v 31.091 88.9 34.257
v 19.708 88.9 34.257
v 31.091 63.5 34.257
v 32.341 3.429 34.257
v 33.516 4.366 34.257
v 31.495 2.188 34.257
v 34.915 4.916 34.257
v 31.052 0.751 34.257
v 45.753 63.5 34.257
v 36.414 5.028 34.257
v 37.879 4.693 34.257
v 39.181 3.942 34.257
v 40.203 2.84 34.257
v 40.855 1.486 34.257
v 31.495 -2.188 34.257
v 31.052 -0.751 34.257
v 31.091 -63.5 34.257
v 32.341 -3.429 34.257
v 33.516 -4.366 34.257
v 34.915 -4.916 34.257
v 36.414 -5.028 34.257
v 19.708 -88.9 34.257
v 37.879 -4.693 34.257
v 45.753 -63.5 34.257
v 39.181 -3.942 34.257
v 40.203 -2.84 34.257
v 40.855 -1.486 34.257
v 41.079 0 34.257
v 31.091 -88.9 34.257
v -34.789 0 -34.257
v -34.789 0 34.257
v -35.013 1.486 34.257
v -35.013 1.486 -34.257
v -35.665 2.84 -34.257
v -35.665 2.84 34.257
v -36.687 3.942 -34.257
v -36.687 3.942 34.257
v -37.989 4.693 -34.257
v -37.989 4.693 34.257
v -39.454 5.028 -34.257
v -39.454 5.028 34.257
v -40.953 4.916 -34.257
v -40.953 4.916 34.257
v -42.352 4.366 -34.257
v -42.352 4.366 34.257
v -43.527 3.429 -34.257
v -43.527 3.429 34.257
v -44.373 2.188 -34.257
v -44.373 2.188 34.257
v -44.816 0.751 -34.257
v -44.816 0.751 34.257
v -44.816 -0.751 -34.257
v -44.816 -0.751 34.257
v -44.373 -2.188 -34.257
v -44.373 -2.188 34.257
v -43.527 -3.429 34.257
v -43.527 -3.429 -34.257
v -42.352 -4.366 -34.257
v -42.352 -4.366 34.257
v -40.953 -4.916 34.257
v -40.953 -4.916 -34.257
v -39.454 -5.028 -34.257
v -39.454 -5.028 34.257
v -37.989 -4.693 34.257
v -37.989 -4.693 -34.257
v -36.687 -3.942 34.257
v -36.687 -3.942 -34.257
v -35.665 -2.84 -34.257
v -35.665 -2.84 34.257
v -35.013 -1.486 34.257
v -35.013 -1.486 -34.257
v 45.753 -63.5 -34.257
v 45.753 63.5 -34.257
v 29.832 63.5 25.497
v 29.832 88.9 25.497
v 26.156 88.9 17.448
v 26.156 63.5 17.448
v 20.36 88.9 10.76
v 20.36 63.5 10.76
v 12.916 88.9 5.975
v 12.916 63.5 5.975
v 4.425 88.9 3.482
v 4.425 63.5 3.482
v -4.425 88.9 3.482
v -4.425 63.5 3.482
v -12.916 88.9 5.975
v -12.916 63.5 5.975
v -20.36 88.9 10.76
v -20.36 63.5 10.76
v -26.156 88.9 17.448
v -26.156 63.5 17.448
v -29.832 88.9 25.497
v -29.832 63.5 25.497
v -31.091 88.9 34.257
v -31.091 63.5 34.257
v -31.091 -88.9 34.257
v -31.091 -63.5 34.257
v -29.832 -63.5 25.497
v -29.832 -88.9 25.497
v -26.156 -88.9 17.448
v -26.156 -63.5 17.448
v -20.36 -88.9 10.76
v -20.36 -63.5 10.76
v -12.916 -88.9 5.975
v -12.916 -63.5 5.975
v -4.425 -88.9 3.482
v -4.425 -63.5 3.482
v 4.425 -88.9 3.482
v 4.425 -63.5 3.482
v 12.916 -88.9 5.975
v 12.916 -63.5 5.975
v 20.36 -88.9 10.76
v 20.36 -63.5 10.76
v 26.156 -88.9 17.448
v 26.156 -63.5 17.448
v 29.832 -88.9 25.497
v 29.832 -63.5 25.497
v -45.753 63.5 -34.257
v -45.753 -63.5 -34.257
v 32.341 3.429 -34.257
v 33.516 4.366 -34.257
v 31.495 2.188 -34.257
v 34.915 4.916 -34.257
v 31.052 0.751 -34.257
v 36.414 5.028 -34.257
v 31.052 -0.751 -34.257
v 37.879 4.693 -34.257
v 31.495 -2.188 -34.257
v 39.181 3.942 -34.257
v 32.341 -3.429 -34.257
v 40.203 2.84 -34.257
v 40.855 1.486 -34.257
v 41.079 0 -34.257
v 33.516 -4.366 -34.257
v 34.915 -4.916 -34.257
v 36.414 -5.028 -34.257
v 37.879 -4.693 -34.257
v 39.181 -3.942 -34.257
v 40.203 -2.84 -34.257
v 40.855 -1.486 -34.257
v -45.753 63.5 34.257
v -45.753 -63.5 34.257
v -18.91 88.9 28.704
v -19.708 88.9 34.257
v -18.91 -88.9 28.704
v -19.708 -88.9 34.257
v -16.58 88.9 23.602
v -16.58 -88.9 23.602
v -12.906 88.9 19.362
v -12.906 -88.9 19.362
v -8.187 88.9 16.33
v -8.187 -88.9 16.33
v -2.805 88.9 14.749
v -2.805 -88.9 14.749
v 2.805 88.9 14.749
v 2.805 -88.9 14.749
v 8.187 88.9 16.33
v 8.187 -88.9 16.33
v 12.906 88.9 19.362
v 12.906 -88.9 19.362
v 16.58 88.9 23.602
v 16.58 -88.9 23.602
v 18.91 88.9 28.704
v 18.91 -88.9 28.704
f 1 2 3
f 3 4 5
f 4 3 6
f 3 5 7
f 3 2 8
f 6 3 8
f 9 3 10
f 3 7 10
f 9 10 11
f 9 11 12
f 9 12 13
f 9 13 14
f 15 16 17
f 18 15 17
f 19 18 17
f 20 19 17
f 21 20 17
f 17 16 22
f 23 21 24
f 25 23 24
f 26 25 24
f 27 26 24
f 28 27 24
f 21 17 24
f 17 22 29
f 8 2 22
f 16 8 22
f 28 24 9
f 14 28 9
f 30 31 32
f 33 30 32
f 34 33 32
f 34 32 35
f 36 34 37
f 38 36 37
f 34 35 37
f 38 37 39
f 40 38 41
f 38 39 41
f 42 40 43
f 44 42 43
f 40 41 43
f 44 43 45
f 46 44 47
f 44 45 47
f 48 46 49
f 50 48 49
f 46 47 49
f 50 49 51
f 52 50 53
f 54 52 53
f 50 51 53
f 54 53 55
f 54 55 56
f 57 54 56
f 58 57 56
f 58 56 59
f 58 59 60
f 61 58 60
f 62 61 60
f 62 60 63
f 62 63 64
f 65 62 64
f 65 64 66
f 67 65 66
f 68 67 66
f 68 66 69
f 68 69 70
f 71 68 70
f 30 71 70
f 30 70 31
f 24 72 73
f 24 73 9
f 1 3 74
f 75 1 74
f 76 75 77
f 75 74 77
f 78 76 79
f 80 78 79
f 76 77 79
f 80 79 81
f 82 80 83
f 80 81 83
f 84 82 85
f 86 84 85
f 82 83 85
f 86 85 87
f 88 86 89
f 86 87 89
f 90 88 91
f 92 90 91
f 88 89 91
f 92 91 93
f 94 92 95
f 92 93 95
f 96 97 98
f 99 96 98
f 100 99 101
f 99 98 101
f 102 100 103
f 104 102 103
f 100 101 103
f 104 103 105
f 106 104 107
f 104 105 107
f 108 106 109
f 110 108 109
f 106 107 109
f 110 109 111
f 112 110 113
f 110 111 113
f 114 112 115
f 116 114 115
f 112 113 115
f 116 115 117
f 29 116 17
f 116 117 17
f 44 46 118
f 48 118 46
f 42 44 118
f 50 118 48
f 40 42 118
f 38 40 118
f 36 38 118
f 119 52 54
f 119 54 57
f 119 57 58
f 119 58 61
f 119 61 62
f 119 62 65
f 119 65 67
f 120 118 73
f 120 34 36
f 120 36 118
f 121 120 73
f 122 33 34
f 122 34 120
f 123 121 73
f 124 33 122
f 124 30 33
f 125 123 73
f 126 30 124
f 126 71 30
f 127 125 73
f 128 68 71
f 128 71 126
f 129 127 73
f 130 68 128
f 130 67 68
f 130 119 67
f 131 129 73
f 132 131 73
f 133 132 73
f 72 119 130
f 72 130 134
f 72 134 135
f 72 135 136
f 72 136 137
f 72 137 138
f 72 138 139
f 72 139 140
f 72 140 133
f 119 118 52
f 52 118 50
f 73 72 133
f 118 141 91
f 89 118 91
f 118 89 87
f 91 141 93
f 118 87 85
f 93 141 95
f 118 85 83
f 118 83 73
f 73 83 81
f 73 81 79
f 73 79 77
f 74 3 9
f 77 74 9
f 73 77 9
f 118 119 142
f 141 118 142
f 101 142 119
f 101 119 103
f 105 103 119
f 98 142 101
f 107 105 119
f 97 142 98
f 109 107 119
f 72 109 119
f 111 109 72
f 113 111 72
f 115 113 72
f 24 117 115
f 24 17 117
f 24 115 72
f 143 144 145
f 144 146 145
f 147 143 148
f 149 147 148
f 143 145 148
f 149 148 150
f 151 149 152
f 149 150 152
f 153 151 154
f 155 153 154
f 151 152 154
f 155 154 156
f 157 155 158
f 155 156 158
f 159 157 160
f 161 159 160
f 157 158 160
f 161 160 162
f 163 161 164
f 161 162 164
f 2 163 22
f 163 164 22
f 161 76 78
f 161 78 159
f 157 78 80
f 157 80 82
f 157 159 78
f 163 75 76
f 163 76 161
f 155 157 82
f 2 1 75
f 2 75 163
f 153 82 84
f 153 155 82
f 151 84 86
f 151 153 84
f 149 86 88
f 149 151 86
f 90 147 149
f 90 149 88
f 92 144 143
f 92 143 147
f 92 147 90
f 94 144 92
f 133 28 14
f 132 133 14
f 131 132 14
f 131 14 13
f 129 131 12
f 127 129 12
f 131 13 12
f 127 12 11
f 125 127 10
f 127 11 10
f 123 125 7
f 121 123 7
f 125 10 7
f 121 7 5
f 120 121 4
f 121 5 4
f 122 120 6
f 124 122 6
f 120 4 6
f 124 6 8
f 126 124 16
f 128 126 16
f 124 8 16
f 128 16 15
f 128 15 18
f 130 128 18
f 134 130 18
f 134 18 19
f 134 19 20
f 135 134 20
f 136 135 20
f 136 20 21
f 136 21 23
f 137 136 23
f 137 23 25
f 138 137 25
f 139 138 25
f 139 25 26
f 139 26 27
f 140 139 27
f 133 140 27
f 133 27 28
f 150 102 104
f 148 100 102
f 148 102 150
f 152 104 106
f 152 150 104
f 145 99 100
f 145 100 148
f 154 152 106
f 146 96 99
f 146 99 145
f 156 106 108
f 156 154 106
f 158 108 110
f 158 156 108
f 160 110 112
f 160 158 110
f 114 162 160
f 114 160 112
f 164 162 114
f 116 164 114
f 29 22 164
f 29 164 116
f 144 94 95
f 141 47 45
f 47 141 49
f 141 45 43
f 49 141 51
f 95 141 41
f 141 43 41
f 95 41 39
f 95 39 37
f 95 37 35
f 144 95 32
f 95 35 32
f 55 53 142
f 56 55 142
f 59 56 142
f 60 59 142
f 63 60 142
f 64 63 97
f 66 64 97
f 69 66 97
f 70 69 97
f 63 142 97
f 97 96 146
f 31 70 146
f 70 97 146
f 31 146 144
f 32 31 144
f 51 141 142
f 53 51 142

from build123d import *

# Parameters (mm, degrees)
F0_W     = 91.506348
F0_H     = 68.513646
F1_DEPTH = 63.5
F3_DEPTH = 25.4
F5_DEPTH = 152.401
F7_DEPTH = 25.4
F8_R     = 5.041929
F9_DEPTH = 68.514647


with BuildPart() as f1:
    # F0 (on Front) → F1 (new body, symmetric)
    with BuildSketch(Plane.XZ):
        Rectangle(F0_W, F0_H)
    extrude(amount=F1_DEPTH, both=True)

    # F2 (on face) → F3 (join)
    with BuildSketch(Plane.XZ.offset(63.5)):
        with BuildLine():
            Line((-19.708274, 34.256823), (-31.091106, 34.256823))
            ThreePointArc((-31.091106, 34.256823), (0, 3.165717), (31.091106, 34.256823))
            Line((31.091106, 34.256823), (19.708274, 34.256823))
            ThreePointArc((19.708274, 34.256823), (0, 14.548549), (-19.708274, 34.256823))
        make_face()
    extrude(amount=F3_DEPTH)

    # F4 (on face) → F5 (cut, through all)
    with BuildSketch(Plane.XZ.offset(88.9)):
        with BuildLine():
            Line((19.708274, 34.256823), (-19.708274, 34.256823))
            ThreePointArc((-19.708274, 34.256823), (0, 14.548549), (19.708274, 34.256823))
        make_face()
    extrude(amount=-F5_DEPTH, mode=Mode.SUBTRACT)

    # F6 (on face) → F7 (join)
    with BuildSketch(Plane(origin=(0, 63.5, 0), x_dir=(-1, 0, 0), z_dir=(0, 1, 0))):
        with BuildLine():
            ThreePointArc((-31.091106, 34.256823), (0, 3.165717), (31.091106, 34.256823))
            Line((31.091106, 34.256823), (19.708274, 34.256823))
            ThreePointArc((19.708274, 34.256823), (0, 14.548549), (-19.708274, 34.256823))
            Line((-19.708274, 34.256823), (-31.091106, 34.256823))
        make_face()
    extrude(amount=F7_DEPTH)

    # F8 (on face) → F9 (cut, through all)
    with BuildSketch(Plane.XY.offset(34.256823)):
        with Locations((36.037404, 0)):
            Circle(F8_R)
        with Locations((-39.830811, 0)):
            Circle(F8_R)
    extrude(amount=-F9_DEPTH, mode=Mode.SUBTRACT)


solid = f1.part
